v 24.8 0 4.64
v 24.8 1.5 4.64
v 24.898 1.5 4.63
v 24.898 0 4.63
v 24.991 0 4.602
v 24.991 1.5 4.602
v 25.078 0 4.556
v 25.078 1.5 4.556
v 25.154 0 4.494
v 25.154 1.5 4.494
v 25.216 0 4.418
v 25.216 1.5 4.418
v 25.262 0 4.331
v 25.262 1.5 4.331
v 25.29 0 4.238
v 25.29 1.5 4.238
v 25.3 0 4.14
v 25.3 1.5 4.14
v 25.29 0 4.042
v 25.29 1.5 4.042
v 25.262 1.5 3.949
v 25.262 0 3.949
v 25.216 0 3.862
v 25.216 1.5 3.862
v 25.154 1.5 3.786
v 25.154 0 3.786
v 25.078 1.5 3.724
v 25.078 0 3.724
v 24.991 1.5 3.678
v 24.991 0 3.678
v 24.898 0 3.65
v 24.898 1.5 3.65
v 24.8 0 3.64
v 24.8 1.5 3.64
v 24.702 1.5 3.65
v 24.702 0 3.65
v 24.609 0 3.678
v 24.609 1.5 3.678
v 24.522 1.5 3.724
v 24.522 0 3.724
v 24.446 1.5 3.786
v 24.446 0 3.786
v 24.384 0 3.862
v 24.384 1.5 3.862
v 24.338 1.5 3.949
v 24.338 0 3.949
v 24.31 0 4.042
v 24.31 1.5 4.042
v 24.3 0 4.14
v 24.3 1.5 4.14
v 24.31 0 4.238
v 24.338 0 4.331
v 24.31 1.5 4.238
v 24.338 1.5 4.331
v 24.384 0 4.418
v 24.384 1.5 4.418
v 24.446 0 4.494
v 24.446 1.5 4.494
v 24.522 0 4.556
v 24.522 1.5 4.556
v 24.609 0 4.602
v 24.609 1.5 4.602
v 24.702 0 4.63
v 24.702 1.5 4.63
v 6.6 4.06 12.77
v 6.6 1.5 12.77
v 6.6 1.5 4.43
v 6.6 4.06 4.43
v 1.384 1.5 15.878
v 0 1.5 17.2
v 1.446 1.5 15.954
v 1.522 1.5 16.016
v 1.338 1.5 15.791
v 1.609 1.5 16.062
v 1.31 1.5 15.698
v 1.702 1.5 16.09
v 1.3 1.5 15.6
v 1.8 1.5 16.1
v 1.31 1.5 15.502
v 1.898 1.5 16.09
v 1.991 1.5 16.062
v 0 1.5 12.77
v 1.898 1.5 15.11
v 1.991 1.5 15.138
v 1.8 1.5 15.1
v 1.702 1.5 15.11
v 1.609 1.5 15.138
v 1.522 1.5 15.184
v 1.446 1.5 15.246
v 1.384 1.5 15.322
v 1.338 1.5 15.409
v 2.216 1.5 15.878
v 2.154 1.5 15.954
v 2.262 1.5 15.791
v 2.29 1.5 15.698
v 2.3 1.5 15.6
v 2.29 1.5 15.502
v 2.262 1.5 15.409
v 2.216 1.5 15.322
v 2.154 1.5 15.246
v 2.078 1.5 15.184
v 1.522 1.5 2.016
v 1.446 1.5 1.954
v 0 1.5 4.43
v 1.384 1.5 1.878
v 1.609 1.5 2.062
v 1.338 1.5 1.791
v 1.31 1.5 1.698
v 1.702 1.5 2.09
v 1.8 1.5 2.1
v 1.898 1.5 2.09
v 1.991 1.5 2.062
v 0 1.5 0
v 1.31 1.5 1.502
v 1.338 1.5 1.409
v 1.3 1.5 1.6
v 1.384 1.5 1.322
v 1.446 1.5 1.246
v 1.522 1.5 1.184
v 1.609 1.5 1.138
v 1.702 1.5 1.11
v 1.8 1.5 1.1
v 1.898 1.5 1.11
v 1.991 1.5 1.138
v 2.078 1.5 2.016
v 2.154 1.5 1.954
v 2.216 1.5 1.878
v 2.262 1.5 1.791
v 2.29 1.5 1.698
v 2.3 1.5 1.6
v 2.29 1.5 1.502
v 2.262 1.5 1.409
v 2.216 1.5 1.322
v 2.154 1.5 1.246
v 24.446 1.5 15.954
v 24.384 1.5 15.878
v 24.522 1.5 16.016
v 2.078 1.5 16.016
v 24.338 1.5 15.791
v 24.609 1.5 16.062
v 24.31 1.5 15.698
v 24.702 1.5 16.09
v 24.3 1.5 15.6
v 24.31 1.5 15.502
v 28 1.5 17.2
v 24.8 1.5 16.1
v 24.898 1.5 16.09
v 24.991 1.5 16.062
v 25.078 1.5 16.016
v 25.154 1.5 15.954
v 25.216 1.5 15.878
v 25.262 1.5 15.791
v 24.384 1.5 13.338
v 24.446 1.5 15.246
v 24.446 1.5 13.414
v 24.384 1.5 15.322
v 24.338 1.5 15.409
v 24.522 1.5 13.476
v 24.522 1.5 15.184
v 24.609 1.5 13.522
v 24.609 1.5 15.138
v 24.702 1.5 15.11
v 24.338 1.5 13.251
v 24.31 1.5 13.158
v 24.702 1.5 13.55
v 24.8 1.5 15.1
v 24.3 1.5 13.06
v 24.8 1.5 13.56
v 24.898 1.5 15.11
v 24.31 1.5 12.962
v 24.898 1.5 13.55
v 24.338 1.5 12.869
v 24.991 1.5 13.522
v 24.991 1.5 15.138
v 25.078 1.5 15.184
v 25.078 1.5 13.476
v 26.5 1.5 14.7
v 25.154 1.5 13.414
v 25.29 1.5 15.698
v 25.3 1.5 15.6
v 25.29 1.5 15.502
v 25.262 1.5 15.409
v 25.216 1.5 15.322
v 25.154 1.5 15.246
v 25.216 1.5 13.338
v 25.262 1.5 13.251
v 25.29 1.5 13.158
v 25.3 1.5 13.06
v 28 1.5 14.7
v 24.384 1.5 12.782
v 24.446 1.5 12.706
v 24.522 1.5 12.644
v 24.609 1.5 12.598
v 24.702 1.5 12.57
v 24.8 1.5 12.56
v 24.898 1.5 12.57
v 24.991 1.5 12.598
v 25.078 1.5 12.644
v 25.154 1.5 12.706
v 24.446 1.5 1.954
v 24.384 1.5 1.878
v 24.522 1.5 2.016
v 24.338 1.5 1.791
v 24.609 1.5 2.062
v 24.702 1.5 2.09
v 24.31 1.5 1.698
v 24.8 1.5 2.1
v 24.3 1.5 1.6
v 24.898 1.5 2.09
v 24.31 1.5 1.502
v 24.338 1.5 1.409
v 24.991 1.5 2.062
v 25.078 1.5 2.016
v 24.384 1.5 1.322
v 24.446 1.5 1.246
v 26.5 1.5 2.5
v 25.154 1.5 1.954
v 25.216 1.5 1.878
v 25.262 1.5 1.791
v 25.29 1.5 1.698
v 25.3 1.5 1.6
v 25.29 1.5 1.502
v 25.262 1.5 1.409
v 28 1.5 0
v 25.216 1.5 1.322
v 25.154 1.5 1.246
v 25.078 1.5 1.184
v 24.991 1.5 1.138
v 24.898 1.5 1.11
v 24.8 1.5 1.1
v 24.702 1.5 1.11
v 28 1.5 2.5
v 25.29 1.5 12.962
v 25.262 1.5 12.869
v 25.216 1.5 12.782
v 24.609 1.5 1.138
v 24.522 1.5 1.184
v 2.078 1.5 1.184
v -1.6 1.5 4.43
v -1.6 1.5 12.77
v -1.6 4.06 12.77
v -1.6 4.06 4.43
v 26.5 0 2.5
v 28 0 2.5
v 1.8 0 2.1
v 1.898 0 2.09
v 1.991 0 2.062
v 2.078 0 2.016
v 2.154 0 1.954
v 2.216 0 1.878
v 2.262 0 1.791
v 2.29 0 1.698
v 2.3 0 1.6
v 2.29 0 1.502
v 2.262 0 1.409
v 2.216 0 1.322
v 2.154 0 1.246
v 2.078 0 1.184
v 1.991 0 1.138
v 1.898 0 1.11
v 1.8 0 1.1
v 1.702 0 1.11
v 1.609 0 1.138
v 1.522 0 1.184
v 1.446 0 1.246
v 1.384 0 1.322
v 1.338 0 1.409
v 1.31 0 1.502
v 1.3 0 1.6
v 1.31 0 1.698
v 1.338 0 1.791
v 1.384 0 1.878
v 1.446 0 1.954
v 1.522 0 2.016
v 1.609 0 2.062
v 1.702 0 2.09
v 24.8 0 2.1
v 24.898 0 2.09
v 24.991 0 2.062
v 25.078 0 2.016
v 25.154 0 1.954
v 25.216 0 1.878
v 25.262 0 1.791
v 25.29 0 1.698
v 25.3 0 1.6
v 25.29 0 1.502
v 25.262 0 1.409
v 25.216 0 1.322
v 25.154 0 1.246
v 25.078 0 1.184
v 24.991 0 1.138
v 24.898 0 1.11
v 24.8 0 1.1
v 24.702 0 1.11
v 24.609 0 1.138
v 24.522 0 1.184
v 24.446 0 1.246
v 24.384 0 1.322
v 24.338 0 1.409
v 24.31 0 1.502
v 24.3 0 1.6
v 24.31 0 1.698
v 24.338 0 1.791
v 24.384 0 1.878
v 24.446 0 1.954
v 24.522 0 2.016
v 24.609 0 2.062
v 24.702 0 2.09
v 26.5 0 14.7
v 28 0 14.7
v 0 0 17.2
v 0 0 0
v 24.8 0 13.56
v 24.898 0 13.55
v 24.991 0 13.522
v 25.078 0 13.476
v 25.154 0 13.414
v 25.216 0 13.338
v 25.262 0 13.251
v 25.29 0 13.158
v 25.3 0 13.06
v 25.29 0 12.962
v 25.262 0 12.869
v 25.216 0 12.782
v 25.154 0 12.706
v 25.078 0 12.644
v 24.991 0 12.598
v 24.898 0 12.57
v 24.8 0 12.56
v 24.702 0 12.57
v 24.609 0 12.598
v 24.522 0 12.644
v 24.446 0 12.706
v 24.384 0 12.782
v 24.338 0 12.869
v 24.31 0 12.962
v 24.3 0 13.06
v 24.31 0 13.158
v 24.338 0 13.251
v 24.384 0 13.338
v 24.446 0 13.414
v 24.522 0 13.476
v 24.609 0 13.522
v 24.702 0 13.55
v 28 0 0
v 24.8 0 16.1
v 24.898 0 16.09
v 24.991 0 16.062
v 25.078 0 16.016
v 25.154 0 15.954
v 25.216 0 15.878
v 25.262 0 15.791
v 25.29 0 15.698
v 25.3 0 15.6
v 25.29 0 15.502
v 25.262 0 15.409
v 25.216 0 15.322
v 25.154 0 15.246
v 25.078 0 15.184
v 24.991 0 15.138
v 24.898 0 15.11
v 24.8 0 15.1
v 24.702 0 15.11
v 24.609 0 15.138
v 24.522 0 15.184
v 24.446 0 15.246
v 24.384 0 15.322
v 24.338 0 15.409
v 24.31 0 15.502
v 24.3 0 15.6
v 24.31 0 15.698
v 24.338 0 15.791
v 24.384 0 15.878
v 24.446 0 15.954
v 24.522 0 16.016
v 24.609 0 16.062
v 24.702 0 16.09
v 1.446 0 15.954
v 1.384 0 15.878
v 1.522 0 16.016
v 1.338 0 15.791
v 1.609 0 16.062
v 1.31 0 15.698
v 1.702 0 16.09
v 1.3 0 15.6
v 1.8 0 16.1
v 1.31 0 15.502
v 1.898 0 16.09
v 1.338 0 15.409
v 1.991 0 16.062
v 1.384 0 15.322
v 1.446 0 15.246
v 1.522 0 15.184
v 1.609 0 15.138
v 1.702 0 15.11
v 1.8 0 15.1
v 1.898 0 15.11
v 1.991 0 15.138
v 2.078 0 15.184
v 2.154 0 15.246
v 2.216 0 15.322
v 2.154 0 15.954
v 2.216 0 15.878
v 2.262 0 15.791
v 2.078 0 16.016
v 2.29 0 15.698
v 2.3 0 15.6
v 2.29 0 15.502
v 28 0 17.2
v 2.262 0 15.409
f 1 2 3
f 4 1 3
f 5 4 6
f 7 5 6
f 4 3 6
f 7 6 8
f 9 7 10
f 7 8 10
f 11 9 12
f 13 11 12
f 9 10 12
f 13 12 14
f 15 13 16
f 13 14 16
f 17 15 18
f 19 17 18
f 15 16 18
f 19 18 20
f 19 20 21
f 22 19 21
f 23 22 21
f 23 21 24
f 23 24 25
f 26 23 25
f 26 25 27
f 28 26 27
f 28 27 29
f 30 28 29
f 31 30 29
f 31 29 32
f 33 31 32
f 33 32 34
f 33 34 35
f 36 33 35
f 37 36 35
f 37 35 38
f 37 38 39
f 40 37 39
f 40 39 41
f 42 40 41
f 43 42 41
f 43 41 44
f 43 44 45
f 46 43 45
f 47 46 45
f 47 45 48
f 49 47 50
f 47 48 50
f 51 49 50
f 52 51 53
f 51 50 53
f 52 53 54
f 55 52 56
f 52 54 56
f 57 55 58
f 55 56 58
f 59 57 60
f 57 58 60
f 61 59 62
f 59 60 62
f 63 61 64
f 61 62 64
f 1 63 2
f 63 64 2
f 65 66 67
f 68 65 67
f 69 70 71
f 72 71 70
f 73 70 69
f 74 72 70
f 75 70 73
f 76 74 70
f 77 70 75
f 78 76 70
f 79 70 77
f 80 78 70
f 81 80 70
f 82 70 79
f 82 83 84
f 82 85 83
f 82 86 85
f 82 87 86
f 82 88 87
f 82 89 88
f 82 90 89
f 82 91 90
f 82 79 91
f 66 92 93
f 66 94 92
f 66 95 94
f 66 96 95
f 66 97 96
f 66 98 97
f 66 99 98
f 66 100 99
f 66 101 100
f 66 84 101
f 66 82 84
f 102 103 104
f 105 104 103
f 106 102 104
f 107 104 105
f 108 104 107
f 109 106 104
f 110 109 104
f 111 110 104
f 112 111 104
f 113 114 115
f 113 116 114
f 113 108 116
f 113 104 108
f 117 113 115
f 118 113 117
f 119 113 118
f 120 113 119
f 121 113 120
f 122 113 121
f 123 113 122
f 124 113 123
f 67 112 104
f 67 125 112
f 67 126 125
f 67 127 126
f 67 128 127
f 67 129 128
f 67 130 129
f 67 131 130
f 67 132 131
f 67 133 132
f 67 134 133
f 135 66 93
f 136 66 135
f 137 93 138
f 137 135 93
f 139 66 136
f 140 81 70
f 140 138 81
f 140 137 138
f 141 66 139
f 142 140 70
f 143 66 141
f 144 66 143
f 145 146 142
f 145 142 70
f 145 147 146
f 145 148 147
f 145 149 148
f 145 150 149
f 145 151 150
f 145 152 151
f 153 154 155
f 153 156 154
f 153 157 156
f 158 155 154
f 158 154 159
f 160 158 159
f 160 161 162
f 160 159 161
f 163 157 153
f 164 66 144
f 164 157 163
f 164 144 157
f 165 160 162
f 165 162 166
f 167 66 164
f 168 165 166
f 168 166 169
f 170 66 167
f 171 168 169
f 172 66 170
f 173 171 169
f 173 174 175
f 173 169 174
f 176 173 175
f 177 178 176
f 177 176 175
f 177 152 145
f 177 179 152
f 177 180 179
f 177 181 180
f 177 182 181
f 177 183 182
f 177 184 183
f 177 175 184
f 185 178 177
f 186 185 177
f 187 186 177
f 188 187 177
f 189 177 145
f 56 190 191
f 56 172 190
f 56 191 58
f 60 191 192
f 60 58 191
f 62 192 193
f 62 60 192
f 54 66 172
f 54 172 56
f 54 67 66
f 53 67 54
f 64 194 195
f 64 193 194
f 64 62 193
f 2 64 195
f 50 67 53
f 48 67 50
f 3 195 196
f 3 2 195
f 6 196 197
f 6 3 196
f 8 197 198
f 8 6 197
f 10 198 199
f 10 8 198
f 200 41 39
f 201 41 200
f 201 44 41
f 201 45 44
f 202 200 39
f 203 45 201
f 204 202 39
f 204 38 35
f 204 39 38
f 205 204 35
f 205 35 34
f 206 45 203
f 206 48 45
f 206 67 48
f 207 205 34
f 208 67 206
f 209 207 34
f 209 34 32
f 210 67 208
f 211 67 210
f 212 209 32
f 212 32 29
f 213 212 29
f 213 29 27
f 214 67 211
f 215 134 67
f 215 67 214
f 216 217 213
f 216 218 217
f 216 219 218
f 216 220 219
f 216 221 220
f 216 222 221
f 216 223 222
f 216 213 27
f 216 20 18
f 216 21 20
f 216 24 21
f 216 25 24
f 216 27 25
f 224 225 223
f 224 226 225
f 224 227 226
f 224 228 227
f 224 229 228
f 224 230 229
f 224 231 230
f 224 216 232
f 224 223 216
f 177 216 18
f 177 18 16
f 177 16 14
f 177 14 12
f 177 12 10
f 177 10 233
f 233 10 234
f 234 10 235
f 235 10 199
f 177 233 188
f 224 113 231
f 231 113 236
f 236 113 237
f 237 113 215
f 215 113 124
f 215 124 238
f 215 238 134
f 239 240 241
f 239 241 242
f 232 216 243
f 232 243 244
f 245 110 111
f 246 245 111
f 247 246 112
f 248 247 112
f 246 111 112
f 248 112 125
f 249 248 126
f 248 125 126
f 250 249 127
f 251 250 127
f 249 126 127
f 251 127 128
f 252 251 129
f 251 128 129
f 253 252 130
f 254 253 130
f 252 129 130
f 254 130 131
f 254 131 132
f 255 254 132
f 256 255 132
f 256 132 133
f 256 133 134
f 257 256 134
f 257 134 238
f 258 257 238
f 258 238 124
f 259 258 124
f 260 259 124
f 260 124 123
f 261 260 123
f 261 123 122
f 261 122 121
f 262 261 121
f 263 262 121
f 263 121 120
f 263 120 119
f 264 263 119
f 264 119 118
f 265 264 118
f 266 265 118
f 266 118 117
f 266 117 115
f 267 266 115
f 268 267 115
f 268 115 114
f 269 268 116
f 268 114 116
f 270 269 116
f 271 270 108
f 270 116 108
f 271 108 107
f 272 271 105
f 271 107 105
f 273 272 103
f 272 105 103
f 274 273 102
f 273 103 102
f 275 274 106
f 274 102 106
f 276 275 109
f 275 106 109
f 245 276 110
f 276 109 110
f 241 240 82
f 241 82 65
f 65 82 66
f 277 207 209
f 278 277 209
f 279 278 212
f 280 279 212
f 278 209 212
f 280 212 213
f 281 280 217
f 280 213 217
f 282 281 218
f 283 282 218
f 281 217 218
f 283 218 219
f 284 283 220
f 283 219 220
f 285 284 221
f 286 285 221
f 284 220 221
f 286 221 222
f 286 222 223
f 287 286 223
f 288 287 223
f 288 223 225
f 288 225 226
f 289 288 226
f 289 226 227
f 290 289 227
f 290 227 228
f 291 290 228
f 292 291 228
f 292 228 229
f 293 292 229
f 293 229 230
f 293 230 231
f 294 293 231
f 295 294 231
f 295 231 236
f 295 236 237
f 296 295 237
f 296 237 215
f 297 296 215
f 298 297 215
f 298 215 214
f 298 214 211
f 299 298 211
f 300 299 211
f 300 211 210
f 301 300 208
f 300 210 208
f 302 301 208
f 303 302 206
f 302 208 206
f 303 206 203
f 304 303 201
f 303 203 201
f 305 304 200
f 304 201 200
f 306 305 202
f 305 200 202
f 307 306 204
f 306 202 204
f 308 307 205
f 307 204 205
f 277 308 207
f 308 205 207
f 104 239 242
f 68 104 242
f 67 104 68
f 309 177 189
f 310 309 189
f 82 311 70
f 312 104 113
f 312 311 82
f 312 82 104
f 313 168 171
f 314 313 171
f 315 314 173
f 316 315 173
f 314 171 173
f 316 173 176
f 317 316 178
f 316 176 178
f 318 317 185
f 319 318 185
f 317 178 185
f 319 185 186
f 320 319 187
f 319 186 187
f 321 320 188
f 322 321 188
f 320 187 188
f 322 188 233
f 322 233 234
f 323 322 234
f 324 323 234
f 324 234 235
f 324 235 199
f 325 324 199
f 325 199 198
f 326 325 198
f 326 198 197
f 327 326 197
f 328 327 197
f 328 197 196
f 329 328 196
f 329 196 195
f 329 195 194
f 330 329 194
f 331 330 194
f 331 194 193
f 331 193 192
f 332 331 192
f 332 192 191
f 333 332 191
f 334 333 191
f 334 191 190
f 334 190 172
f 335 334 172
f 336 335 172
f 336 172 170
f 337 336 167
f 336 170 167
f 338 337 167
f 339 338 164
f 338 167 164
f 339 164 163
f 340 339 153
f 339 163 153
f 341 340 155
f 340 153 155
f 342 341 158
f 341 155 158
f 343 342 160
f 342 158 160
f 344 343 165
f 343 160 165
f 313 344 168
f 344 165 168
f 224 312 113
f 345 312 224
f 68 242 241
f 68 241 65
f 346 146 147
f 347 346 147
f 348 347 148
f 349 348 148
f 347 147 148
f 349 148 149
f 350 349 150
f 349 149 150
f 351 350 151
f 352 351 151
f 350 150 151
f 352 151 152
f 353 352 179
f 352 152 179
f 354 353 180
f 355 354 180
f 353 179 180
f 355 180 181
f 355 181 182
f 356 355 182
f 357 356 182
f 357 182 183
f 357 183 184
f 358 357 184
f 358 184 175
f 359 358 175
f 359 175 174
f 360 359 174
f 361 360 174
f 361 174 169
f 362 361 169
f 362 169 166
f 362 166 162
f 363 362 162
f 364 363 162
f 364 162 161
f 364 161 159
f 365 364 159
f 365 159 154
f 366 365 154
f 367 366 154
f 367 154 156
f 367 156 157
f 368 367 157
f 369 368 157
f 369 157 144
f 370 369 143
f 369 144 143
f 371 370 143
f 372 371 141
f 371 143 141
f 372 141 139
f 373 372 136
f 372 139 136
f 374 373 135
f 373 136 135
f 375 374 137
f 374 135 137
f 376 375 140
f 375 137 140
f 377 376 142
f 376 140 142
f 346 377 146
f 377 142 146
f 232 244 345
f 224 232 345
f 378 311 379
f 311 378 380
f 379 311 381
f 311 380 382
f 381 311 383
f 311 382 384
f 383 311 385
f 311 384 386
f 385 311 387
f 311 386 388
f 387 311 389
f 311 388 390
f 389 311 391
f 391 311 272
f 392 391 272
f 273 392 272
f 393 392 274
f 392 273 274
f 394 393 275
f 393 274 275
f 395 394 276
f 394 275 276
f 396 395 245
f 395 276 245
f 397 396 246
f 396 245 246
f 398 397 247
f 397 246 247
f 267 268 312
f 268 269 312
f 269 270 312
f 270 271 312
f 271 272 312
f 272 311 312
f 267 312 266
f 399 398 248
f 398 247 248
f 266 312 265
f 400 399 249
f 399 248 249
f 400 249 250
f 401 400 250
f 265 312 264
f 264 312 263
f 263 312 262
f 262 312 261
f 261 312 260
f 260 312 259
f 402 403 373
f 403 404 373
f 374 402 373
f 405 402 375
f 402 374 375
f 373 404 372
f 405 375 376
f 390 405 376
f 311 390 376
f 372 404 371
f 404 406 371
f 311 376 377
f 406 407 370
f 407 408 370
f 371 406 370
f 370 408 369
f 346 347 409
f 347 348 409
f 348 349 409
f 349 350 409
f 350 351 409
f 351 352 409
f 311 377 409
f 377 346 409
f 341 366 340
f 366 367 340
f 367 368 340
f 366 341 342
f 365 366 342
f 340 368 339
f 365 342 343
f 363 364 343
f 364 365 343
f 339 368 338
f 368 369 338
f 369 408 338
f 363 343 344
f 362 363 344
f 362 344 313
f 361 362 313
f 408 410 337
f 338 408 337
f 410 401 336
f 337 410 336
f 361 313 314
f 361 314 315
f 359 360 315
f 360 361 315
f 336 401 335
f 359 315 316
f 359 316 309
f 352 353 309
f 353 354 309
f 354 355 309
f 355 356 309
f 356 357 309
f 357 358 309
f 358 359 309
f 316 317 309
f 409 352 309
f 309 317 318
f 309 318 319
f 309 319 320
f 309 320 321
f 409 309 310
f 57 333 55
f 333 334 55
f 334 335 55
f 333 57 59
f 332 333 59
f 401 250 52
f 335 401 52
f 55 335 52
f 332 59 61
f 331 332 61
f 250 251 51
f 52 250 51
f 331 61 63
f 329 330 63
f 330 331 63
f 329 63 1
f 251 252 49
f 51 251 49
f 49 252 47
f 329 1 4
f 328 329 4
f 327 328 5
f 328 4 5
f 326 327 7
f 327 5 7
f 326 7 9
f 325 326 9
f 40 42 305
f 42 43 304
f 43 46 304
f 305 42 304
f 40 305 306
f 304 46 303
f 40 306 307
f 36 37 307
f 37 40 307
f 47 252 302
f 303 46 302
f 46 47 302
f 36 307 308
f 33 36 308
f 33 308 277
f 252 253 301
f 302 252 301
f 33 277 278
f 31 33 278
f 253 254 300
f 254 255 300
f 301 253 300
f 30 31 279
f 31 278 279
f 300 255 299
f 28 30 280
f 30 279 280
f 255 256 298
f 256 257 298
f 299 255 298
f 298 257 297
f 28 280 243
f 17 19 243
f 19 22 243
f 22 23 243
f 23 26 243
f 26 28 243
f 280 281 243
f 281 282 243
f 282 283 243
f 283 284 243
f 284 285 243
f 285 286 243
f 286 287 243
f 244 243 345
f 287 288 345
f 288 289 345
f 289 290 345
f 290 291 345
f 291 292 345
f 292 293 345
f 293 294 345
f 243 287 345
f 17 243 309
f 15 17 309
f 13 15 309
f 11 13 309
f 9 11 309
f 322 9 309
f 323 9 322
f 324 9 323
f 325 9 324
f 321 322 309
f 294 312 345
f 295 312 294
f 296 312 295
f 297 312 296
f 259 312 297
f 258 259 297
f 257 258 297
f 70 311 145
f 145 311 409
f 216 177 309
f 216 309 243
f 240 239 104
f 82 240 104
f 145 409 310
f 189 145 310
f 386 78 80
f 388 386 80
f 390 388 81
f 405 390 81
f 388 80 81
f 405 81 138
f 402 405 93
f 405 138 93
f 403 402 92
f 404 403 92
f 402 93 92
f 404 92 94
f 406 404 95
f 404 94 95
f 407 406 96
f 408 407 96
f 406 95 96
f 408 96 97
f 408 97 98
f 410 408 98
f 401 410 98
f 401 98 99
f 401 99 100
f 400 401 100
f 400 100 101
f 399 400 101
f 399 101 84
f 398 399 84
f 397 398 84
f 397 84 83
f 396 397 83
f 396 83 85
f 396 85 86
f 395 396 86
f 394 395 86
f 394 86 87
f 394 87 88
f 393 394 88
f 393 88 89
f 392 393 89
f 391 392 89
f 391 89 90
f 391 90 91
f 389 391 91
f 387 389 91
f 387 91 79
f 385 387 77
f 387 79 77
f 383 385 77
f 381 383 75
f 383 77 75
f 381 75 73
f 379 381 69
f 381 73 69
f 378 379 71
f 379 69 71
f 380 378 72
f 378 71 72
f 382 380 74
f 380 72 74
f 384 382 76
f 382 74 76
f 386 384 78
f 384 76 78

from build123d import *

# Parameters (mm, degrees)
SKETCH_1_W          = 28
SKETCH_1_H          = 17.2
EXTRUDE_1_DEPTH     = 1.5
SKETCH_2_W          = 8.2
SKETCH_2_H          = 8.34
EXTRUDE_2_DEPTH     = 2.56
SKETCH_3_R          = 0.5
CUT_EXTRUDE_1_DEPTH = 10
SKETCH_4_W          = 1.5
SKETCH_4_H          = 12.2
CUT_EXTRUDE_2_DEPTH = 10


with BuildPart() as part:
    # Эскиз1 → Бобышка-Вытянуть1 (new body)
    with BuildSketch(Plane(origin=(0, 0, 0), x_dir=(1, 0, 0), z_dir=(0, 1, 0))):
        with Locations((14, -8.6)):
            Rectangle(SKETCH_1_W, SKETCH_1_H)
    extrude(amount=EXTRUDE_1_DEPTH)

    # Эскиз2 → Бобышка-Вытянуть2 (add)
    with BuildSketch(Plane(origin=(0, 1.5, 0), x_dir=(1, 0, 0), z_dir=(0, 1, 0))):
        with Locations((2.5, -8.6)):
            Rectangle(SKETCH_2_W, SKETCH_2_H)
    extrude(amount=EXTRUDE_2_DEPTH)

    # Эскиз3 → Вырез-Вытянуть1 (cut)
    with BuildSketch(Plane(origin=(0, 1.5, 0), x_dir=(1, 0, 0), z_dir=(0, 1, 0))):
        with Locations((1.8, -1.6)):
            Circle(SKETCH_3_R)
        with Locations((1.8, -15.6)):
            Circle(SKETCH_3_R)
        with Locations((24.8, -1.6)):
            Circle(SKETCH_3_R)
        with Locations((24.8, -4.14)):
            Circle(SKETCH_3_R)
        with Locations((24.8, -13.06)):
            Circle(SKETCH_3_R)
        with Locations((24.8, -15.6)):
            Circle(SKETCH_3_R)
    extrude(amount=-CUT_EXTRUDE_1_DEPTH, mode=Mode.SUBTRACT)

    # Эскиз4 → Вырез-Вытянуть2 (cut)
    with BuildSketch(Plane(origin=(0, 1.5, 0), x_dir=(1, 0, 0), z_dir=(0, 1, 0))):
        with Locations((27.25, -8.6)):
            Rectangle(SKETCH_4_W, SKETCH_4_H)
    extrude(amount=-CUT_EXTRUDE_2_DEPTH, mode=Mode.SUBTRACT)


solid = part.part
